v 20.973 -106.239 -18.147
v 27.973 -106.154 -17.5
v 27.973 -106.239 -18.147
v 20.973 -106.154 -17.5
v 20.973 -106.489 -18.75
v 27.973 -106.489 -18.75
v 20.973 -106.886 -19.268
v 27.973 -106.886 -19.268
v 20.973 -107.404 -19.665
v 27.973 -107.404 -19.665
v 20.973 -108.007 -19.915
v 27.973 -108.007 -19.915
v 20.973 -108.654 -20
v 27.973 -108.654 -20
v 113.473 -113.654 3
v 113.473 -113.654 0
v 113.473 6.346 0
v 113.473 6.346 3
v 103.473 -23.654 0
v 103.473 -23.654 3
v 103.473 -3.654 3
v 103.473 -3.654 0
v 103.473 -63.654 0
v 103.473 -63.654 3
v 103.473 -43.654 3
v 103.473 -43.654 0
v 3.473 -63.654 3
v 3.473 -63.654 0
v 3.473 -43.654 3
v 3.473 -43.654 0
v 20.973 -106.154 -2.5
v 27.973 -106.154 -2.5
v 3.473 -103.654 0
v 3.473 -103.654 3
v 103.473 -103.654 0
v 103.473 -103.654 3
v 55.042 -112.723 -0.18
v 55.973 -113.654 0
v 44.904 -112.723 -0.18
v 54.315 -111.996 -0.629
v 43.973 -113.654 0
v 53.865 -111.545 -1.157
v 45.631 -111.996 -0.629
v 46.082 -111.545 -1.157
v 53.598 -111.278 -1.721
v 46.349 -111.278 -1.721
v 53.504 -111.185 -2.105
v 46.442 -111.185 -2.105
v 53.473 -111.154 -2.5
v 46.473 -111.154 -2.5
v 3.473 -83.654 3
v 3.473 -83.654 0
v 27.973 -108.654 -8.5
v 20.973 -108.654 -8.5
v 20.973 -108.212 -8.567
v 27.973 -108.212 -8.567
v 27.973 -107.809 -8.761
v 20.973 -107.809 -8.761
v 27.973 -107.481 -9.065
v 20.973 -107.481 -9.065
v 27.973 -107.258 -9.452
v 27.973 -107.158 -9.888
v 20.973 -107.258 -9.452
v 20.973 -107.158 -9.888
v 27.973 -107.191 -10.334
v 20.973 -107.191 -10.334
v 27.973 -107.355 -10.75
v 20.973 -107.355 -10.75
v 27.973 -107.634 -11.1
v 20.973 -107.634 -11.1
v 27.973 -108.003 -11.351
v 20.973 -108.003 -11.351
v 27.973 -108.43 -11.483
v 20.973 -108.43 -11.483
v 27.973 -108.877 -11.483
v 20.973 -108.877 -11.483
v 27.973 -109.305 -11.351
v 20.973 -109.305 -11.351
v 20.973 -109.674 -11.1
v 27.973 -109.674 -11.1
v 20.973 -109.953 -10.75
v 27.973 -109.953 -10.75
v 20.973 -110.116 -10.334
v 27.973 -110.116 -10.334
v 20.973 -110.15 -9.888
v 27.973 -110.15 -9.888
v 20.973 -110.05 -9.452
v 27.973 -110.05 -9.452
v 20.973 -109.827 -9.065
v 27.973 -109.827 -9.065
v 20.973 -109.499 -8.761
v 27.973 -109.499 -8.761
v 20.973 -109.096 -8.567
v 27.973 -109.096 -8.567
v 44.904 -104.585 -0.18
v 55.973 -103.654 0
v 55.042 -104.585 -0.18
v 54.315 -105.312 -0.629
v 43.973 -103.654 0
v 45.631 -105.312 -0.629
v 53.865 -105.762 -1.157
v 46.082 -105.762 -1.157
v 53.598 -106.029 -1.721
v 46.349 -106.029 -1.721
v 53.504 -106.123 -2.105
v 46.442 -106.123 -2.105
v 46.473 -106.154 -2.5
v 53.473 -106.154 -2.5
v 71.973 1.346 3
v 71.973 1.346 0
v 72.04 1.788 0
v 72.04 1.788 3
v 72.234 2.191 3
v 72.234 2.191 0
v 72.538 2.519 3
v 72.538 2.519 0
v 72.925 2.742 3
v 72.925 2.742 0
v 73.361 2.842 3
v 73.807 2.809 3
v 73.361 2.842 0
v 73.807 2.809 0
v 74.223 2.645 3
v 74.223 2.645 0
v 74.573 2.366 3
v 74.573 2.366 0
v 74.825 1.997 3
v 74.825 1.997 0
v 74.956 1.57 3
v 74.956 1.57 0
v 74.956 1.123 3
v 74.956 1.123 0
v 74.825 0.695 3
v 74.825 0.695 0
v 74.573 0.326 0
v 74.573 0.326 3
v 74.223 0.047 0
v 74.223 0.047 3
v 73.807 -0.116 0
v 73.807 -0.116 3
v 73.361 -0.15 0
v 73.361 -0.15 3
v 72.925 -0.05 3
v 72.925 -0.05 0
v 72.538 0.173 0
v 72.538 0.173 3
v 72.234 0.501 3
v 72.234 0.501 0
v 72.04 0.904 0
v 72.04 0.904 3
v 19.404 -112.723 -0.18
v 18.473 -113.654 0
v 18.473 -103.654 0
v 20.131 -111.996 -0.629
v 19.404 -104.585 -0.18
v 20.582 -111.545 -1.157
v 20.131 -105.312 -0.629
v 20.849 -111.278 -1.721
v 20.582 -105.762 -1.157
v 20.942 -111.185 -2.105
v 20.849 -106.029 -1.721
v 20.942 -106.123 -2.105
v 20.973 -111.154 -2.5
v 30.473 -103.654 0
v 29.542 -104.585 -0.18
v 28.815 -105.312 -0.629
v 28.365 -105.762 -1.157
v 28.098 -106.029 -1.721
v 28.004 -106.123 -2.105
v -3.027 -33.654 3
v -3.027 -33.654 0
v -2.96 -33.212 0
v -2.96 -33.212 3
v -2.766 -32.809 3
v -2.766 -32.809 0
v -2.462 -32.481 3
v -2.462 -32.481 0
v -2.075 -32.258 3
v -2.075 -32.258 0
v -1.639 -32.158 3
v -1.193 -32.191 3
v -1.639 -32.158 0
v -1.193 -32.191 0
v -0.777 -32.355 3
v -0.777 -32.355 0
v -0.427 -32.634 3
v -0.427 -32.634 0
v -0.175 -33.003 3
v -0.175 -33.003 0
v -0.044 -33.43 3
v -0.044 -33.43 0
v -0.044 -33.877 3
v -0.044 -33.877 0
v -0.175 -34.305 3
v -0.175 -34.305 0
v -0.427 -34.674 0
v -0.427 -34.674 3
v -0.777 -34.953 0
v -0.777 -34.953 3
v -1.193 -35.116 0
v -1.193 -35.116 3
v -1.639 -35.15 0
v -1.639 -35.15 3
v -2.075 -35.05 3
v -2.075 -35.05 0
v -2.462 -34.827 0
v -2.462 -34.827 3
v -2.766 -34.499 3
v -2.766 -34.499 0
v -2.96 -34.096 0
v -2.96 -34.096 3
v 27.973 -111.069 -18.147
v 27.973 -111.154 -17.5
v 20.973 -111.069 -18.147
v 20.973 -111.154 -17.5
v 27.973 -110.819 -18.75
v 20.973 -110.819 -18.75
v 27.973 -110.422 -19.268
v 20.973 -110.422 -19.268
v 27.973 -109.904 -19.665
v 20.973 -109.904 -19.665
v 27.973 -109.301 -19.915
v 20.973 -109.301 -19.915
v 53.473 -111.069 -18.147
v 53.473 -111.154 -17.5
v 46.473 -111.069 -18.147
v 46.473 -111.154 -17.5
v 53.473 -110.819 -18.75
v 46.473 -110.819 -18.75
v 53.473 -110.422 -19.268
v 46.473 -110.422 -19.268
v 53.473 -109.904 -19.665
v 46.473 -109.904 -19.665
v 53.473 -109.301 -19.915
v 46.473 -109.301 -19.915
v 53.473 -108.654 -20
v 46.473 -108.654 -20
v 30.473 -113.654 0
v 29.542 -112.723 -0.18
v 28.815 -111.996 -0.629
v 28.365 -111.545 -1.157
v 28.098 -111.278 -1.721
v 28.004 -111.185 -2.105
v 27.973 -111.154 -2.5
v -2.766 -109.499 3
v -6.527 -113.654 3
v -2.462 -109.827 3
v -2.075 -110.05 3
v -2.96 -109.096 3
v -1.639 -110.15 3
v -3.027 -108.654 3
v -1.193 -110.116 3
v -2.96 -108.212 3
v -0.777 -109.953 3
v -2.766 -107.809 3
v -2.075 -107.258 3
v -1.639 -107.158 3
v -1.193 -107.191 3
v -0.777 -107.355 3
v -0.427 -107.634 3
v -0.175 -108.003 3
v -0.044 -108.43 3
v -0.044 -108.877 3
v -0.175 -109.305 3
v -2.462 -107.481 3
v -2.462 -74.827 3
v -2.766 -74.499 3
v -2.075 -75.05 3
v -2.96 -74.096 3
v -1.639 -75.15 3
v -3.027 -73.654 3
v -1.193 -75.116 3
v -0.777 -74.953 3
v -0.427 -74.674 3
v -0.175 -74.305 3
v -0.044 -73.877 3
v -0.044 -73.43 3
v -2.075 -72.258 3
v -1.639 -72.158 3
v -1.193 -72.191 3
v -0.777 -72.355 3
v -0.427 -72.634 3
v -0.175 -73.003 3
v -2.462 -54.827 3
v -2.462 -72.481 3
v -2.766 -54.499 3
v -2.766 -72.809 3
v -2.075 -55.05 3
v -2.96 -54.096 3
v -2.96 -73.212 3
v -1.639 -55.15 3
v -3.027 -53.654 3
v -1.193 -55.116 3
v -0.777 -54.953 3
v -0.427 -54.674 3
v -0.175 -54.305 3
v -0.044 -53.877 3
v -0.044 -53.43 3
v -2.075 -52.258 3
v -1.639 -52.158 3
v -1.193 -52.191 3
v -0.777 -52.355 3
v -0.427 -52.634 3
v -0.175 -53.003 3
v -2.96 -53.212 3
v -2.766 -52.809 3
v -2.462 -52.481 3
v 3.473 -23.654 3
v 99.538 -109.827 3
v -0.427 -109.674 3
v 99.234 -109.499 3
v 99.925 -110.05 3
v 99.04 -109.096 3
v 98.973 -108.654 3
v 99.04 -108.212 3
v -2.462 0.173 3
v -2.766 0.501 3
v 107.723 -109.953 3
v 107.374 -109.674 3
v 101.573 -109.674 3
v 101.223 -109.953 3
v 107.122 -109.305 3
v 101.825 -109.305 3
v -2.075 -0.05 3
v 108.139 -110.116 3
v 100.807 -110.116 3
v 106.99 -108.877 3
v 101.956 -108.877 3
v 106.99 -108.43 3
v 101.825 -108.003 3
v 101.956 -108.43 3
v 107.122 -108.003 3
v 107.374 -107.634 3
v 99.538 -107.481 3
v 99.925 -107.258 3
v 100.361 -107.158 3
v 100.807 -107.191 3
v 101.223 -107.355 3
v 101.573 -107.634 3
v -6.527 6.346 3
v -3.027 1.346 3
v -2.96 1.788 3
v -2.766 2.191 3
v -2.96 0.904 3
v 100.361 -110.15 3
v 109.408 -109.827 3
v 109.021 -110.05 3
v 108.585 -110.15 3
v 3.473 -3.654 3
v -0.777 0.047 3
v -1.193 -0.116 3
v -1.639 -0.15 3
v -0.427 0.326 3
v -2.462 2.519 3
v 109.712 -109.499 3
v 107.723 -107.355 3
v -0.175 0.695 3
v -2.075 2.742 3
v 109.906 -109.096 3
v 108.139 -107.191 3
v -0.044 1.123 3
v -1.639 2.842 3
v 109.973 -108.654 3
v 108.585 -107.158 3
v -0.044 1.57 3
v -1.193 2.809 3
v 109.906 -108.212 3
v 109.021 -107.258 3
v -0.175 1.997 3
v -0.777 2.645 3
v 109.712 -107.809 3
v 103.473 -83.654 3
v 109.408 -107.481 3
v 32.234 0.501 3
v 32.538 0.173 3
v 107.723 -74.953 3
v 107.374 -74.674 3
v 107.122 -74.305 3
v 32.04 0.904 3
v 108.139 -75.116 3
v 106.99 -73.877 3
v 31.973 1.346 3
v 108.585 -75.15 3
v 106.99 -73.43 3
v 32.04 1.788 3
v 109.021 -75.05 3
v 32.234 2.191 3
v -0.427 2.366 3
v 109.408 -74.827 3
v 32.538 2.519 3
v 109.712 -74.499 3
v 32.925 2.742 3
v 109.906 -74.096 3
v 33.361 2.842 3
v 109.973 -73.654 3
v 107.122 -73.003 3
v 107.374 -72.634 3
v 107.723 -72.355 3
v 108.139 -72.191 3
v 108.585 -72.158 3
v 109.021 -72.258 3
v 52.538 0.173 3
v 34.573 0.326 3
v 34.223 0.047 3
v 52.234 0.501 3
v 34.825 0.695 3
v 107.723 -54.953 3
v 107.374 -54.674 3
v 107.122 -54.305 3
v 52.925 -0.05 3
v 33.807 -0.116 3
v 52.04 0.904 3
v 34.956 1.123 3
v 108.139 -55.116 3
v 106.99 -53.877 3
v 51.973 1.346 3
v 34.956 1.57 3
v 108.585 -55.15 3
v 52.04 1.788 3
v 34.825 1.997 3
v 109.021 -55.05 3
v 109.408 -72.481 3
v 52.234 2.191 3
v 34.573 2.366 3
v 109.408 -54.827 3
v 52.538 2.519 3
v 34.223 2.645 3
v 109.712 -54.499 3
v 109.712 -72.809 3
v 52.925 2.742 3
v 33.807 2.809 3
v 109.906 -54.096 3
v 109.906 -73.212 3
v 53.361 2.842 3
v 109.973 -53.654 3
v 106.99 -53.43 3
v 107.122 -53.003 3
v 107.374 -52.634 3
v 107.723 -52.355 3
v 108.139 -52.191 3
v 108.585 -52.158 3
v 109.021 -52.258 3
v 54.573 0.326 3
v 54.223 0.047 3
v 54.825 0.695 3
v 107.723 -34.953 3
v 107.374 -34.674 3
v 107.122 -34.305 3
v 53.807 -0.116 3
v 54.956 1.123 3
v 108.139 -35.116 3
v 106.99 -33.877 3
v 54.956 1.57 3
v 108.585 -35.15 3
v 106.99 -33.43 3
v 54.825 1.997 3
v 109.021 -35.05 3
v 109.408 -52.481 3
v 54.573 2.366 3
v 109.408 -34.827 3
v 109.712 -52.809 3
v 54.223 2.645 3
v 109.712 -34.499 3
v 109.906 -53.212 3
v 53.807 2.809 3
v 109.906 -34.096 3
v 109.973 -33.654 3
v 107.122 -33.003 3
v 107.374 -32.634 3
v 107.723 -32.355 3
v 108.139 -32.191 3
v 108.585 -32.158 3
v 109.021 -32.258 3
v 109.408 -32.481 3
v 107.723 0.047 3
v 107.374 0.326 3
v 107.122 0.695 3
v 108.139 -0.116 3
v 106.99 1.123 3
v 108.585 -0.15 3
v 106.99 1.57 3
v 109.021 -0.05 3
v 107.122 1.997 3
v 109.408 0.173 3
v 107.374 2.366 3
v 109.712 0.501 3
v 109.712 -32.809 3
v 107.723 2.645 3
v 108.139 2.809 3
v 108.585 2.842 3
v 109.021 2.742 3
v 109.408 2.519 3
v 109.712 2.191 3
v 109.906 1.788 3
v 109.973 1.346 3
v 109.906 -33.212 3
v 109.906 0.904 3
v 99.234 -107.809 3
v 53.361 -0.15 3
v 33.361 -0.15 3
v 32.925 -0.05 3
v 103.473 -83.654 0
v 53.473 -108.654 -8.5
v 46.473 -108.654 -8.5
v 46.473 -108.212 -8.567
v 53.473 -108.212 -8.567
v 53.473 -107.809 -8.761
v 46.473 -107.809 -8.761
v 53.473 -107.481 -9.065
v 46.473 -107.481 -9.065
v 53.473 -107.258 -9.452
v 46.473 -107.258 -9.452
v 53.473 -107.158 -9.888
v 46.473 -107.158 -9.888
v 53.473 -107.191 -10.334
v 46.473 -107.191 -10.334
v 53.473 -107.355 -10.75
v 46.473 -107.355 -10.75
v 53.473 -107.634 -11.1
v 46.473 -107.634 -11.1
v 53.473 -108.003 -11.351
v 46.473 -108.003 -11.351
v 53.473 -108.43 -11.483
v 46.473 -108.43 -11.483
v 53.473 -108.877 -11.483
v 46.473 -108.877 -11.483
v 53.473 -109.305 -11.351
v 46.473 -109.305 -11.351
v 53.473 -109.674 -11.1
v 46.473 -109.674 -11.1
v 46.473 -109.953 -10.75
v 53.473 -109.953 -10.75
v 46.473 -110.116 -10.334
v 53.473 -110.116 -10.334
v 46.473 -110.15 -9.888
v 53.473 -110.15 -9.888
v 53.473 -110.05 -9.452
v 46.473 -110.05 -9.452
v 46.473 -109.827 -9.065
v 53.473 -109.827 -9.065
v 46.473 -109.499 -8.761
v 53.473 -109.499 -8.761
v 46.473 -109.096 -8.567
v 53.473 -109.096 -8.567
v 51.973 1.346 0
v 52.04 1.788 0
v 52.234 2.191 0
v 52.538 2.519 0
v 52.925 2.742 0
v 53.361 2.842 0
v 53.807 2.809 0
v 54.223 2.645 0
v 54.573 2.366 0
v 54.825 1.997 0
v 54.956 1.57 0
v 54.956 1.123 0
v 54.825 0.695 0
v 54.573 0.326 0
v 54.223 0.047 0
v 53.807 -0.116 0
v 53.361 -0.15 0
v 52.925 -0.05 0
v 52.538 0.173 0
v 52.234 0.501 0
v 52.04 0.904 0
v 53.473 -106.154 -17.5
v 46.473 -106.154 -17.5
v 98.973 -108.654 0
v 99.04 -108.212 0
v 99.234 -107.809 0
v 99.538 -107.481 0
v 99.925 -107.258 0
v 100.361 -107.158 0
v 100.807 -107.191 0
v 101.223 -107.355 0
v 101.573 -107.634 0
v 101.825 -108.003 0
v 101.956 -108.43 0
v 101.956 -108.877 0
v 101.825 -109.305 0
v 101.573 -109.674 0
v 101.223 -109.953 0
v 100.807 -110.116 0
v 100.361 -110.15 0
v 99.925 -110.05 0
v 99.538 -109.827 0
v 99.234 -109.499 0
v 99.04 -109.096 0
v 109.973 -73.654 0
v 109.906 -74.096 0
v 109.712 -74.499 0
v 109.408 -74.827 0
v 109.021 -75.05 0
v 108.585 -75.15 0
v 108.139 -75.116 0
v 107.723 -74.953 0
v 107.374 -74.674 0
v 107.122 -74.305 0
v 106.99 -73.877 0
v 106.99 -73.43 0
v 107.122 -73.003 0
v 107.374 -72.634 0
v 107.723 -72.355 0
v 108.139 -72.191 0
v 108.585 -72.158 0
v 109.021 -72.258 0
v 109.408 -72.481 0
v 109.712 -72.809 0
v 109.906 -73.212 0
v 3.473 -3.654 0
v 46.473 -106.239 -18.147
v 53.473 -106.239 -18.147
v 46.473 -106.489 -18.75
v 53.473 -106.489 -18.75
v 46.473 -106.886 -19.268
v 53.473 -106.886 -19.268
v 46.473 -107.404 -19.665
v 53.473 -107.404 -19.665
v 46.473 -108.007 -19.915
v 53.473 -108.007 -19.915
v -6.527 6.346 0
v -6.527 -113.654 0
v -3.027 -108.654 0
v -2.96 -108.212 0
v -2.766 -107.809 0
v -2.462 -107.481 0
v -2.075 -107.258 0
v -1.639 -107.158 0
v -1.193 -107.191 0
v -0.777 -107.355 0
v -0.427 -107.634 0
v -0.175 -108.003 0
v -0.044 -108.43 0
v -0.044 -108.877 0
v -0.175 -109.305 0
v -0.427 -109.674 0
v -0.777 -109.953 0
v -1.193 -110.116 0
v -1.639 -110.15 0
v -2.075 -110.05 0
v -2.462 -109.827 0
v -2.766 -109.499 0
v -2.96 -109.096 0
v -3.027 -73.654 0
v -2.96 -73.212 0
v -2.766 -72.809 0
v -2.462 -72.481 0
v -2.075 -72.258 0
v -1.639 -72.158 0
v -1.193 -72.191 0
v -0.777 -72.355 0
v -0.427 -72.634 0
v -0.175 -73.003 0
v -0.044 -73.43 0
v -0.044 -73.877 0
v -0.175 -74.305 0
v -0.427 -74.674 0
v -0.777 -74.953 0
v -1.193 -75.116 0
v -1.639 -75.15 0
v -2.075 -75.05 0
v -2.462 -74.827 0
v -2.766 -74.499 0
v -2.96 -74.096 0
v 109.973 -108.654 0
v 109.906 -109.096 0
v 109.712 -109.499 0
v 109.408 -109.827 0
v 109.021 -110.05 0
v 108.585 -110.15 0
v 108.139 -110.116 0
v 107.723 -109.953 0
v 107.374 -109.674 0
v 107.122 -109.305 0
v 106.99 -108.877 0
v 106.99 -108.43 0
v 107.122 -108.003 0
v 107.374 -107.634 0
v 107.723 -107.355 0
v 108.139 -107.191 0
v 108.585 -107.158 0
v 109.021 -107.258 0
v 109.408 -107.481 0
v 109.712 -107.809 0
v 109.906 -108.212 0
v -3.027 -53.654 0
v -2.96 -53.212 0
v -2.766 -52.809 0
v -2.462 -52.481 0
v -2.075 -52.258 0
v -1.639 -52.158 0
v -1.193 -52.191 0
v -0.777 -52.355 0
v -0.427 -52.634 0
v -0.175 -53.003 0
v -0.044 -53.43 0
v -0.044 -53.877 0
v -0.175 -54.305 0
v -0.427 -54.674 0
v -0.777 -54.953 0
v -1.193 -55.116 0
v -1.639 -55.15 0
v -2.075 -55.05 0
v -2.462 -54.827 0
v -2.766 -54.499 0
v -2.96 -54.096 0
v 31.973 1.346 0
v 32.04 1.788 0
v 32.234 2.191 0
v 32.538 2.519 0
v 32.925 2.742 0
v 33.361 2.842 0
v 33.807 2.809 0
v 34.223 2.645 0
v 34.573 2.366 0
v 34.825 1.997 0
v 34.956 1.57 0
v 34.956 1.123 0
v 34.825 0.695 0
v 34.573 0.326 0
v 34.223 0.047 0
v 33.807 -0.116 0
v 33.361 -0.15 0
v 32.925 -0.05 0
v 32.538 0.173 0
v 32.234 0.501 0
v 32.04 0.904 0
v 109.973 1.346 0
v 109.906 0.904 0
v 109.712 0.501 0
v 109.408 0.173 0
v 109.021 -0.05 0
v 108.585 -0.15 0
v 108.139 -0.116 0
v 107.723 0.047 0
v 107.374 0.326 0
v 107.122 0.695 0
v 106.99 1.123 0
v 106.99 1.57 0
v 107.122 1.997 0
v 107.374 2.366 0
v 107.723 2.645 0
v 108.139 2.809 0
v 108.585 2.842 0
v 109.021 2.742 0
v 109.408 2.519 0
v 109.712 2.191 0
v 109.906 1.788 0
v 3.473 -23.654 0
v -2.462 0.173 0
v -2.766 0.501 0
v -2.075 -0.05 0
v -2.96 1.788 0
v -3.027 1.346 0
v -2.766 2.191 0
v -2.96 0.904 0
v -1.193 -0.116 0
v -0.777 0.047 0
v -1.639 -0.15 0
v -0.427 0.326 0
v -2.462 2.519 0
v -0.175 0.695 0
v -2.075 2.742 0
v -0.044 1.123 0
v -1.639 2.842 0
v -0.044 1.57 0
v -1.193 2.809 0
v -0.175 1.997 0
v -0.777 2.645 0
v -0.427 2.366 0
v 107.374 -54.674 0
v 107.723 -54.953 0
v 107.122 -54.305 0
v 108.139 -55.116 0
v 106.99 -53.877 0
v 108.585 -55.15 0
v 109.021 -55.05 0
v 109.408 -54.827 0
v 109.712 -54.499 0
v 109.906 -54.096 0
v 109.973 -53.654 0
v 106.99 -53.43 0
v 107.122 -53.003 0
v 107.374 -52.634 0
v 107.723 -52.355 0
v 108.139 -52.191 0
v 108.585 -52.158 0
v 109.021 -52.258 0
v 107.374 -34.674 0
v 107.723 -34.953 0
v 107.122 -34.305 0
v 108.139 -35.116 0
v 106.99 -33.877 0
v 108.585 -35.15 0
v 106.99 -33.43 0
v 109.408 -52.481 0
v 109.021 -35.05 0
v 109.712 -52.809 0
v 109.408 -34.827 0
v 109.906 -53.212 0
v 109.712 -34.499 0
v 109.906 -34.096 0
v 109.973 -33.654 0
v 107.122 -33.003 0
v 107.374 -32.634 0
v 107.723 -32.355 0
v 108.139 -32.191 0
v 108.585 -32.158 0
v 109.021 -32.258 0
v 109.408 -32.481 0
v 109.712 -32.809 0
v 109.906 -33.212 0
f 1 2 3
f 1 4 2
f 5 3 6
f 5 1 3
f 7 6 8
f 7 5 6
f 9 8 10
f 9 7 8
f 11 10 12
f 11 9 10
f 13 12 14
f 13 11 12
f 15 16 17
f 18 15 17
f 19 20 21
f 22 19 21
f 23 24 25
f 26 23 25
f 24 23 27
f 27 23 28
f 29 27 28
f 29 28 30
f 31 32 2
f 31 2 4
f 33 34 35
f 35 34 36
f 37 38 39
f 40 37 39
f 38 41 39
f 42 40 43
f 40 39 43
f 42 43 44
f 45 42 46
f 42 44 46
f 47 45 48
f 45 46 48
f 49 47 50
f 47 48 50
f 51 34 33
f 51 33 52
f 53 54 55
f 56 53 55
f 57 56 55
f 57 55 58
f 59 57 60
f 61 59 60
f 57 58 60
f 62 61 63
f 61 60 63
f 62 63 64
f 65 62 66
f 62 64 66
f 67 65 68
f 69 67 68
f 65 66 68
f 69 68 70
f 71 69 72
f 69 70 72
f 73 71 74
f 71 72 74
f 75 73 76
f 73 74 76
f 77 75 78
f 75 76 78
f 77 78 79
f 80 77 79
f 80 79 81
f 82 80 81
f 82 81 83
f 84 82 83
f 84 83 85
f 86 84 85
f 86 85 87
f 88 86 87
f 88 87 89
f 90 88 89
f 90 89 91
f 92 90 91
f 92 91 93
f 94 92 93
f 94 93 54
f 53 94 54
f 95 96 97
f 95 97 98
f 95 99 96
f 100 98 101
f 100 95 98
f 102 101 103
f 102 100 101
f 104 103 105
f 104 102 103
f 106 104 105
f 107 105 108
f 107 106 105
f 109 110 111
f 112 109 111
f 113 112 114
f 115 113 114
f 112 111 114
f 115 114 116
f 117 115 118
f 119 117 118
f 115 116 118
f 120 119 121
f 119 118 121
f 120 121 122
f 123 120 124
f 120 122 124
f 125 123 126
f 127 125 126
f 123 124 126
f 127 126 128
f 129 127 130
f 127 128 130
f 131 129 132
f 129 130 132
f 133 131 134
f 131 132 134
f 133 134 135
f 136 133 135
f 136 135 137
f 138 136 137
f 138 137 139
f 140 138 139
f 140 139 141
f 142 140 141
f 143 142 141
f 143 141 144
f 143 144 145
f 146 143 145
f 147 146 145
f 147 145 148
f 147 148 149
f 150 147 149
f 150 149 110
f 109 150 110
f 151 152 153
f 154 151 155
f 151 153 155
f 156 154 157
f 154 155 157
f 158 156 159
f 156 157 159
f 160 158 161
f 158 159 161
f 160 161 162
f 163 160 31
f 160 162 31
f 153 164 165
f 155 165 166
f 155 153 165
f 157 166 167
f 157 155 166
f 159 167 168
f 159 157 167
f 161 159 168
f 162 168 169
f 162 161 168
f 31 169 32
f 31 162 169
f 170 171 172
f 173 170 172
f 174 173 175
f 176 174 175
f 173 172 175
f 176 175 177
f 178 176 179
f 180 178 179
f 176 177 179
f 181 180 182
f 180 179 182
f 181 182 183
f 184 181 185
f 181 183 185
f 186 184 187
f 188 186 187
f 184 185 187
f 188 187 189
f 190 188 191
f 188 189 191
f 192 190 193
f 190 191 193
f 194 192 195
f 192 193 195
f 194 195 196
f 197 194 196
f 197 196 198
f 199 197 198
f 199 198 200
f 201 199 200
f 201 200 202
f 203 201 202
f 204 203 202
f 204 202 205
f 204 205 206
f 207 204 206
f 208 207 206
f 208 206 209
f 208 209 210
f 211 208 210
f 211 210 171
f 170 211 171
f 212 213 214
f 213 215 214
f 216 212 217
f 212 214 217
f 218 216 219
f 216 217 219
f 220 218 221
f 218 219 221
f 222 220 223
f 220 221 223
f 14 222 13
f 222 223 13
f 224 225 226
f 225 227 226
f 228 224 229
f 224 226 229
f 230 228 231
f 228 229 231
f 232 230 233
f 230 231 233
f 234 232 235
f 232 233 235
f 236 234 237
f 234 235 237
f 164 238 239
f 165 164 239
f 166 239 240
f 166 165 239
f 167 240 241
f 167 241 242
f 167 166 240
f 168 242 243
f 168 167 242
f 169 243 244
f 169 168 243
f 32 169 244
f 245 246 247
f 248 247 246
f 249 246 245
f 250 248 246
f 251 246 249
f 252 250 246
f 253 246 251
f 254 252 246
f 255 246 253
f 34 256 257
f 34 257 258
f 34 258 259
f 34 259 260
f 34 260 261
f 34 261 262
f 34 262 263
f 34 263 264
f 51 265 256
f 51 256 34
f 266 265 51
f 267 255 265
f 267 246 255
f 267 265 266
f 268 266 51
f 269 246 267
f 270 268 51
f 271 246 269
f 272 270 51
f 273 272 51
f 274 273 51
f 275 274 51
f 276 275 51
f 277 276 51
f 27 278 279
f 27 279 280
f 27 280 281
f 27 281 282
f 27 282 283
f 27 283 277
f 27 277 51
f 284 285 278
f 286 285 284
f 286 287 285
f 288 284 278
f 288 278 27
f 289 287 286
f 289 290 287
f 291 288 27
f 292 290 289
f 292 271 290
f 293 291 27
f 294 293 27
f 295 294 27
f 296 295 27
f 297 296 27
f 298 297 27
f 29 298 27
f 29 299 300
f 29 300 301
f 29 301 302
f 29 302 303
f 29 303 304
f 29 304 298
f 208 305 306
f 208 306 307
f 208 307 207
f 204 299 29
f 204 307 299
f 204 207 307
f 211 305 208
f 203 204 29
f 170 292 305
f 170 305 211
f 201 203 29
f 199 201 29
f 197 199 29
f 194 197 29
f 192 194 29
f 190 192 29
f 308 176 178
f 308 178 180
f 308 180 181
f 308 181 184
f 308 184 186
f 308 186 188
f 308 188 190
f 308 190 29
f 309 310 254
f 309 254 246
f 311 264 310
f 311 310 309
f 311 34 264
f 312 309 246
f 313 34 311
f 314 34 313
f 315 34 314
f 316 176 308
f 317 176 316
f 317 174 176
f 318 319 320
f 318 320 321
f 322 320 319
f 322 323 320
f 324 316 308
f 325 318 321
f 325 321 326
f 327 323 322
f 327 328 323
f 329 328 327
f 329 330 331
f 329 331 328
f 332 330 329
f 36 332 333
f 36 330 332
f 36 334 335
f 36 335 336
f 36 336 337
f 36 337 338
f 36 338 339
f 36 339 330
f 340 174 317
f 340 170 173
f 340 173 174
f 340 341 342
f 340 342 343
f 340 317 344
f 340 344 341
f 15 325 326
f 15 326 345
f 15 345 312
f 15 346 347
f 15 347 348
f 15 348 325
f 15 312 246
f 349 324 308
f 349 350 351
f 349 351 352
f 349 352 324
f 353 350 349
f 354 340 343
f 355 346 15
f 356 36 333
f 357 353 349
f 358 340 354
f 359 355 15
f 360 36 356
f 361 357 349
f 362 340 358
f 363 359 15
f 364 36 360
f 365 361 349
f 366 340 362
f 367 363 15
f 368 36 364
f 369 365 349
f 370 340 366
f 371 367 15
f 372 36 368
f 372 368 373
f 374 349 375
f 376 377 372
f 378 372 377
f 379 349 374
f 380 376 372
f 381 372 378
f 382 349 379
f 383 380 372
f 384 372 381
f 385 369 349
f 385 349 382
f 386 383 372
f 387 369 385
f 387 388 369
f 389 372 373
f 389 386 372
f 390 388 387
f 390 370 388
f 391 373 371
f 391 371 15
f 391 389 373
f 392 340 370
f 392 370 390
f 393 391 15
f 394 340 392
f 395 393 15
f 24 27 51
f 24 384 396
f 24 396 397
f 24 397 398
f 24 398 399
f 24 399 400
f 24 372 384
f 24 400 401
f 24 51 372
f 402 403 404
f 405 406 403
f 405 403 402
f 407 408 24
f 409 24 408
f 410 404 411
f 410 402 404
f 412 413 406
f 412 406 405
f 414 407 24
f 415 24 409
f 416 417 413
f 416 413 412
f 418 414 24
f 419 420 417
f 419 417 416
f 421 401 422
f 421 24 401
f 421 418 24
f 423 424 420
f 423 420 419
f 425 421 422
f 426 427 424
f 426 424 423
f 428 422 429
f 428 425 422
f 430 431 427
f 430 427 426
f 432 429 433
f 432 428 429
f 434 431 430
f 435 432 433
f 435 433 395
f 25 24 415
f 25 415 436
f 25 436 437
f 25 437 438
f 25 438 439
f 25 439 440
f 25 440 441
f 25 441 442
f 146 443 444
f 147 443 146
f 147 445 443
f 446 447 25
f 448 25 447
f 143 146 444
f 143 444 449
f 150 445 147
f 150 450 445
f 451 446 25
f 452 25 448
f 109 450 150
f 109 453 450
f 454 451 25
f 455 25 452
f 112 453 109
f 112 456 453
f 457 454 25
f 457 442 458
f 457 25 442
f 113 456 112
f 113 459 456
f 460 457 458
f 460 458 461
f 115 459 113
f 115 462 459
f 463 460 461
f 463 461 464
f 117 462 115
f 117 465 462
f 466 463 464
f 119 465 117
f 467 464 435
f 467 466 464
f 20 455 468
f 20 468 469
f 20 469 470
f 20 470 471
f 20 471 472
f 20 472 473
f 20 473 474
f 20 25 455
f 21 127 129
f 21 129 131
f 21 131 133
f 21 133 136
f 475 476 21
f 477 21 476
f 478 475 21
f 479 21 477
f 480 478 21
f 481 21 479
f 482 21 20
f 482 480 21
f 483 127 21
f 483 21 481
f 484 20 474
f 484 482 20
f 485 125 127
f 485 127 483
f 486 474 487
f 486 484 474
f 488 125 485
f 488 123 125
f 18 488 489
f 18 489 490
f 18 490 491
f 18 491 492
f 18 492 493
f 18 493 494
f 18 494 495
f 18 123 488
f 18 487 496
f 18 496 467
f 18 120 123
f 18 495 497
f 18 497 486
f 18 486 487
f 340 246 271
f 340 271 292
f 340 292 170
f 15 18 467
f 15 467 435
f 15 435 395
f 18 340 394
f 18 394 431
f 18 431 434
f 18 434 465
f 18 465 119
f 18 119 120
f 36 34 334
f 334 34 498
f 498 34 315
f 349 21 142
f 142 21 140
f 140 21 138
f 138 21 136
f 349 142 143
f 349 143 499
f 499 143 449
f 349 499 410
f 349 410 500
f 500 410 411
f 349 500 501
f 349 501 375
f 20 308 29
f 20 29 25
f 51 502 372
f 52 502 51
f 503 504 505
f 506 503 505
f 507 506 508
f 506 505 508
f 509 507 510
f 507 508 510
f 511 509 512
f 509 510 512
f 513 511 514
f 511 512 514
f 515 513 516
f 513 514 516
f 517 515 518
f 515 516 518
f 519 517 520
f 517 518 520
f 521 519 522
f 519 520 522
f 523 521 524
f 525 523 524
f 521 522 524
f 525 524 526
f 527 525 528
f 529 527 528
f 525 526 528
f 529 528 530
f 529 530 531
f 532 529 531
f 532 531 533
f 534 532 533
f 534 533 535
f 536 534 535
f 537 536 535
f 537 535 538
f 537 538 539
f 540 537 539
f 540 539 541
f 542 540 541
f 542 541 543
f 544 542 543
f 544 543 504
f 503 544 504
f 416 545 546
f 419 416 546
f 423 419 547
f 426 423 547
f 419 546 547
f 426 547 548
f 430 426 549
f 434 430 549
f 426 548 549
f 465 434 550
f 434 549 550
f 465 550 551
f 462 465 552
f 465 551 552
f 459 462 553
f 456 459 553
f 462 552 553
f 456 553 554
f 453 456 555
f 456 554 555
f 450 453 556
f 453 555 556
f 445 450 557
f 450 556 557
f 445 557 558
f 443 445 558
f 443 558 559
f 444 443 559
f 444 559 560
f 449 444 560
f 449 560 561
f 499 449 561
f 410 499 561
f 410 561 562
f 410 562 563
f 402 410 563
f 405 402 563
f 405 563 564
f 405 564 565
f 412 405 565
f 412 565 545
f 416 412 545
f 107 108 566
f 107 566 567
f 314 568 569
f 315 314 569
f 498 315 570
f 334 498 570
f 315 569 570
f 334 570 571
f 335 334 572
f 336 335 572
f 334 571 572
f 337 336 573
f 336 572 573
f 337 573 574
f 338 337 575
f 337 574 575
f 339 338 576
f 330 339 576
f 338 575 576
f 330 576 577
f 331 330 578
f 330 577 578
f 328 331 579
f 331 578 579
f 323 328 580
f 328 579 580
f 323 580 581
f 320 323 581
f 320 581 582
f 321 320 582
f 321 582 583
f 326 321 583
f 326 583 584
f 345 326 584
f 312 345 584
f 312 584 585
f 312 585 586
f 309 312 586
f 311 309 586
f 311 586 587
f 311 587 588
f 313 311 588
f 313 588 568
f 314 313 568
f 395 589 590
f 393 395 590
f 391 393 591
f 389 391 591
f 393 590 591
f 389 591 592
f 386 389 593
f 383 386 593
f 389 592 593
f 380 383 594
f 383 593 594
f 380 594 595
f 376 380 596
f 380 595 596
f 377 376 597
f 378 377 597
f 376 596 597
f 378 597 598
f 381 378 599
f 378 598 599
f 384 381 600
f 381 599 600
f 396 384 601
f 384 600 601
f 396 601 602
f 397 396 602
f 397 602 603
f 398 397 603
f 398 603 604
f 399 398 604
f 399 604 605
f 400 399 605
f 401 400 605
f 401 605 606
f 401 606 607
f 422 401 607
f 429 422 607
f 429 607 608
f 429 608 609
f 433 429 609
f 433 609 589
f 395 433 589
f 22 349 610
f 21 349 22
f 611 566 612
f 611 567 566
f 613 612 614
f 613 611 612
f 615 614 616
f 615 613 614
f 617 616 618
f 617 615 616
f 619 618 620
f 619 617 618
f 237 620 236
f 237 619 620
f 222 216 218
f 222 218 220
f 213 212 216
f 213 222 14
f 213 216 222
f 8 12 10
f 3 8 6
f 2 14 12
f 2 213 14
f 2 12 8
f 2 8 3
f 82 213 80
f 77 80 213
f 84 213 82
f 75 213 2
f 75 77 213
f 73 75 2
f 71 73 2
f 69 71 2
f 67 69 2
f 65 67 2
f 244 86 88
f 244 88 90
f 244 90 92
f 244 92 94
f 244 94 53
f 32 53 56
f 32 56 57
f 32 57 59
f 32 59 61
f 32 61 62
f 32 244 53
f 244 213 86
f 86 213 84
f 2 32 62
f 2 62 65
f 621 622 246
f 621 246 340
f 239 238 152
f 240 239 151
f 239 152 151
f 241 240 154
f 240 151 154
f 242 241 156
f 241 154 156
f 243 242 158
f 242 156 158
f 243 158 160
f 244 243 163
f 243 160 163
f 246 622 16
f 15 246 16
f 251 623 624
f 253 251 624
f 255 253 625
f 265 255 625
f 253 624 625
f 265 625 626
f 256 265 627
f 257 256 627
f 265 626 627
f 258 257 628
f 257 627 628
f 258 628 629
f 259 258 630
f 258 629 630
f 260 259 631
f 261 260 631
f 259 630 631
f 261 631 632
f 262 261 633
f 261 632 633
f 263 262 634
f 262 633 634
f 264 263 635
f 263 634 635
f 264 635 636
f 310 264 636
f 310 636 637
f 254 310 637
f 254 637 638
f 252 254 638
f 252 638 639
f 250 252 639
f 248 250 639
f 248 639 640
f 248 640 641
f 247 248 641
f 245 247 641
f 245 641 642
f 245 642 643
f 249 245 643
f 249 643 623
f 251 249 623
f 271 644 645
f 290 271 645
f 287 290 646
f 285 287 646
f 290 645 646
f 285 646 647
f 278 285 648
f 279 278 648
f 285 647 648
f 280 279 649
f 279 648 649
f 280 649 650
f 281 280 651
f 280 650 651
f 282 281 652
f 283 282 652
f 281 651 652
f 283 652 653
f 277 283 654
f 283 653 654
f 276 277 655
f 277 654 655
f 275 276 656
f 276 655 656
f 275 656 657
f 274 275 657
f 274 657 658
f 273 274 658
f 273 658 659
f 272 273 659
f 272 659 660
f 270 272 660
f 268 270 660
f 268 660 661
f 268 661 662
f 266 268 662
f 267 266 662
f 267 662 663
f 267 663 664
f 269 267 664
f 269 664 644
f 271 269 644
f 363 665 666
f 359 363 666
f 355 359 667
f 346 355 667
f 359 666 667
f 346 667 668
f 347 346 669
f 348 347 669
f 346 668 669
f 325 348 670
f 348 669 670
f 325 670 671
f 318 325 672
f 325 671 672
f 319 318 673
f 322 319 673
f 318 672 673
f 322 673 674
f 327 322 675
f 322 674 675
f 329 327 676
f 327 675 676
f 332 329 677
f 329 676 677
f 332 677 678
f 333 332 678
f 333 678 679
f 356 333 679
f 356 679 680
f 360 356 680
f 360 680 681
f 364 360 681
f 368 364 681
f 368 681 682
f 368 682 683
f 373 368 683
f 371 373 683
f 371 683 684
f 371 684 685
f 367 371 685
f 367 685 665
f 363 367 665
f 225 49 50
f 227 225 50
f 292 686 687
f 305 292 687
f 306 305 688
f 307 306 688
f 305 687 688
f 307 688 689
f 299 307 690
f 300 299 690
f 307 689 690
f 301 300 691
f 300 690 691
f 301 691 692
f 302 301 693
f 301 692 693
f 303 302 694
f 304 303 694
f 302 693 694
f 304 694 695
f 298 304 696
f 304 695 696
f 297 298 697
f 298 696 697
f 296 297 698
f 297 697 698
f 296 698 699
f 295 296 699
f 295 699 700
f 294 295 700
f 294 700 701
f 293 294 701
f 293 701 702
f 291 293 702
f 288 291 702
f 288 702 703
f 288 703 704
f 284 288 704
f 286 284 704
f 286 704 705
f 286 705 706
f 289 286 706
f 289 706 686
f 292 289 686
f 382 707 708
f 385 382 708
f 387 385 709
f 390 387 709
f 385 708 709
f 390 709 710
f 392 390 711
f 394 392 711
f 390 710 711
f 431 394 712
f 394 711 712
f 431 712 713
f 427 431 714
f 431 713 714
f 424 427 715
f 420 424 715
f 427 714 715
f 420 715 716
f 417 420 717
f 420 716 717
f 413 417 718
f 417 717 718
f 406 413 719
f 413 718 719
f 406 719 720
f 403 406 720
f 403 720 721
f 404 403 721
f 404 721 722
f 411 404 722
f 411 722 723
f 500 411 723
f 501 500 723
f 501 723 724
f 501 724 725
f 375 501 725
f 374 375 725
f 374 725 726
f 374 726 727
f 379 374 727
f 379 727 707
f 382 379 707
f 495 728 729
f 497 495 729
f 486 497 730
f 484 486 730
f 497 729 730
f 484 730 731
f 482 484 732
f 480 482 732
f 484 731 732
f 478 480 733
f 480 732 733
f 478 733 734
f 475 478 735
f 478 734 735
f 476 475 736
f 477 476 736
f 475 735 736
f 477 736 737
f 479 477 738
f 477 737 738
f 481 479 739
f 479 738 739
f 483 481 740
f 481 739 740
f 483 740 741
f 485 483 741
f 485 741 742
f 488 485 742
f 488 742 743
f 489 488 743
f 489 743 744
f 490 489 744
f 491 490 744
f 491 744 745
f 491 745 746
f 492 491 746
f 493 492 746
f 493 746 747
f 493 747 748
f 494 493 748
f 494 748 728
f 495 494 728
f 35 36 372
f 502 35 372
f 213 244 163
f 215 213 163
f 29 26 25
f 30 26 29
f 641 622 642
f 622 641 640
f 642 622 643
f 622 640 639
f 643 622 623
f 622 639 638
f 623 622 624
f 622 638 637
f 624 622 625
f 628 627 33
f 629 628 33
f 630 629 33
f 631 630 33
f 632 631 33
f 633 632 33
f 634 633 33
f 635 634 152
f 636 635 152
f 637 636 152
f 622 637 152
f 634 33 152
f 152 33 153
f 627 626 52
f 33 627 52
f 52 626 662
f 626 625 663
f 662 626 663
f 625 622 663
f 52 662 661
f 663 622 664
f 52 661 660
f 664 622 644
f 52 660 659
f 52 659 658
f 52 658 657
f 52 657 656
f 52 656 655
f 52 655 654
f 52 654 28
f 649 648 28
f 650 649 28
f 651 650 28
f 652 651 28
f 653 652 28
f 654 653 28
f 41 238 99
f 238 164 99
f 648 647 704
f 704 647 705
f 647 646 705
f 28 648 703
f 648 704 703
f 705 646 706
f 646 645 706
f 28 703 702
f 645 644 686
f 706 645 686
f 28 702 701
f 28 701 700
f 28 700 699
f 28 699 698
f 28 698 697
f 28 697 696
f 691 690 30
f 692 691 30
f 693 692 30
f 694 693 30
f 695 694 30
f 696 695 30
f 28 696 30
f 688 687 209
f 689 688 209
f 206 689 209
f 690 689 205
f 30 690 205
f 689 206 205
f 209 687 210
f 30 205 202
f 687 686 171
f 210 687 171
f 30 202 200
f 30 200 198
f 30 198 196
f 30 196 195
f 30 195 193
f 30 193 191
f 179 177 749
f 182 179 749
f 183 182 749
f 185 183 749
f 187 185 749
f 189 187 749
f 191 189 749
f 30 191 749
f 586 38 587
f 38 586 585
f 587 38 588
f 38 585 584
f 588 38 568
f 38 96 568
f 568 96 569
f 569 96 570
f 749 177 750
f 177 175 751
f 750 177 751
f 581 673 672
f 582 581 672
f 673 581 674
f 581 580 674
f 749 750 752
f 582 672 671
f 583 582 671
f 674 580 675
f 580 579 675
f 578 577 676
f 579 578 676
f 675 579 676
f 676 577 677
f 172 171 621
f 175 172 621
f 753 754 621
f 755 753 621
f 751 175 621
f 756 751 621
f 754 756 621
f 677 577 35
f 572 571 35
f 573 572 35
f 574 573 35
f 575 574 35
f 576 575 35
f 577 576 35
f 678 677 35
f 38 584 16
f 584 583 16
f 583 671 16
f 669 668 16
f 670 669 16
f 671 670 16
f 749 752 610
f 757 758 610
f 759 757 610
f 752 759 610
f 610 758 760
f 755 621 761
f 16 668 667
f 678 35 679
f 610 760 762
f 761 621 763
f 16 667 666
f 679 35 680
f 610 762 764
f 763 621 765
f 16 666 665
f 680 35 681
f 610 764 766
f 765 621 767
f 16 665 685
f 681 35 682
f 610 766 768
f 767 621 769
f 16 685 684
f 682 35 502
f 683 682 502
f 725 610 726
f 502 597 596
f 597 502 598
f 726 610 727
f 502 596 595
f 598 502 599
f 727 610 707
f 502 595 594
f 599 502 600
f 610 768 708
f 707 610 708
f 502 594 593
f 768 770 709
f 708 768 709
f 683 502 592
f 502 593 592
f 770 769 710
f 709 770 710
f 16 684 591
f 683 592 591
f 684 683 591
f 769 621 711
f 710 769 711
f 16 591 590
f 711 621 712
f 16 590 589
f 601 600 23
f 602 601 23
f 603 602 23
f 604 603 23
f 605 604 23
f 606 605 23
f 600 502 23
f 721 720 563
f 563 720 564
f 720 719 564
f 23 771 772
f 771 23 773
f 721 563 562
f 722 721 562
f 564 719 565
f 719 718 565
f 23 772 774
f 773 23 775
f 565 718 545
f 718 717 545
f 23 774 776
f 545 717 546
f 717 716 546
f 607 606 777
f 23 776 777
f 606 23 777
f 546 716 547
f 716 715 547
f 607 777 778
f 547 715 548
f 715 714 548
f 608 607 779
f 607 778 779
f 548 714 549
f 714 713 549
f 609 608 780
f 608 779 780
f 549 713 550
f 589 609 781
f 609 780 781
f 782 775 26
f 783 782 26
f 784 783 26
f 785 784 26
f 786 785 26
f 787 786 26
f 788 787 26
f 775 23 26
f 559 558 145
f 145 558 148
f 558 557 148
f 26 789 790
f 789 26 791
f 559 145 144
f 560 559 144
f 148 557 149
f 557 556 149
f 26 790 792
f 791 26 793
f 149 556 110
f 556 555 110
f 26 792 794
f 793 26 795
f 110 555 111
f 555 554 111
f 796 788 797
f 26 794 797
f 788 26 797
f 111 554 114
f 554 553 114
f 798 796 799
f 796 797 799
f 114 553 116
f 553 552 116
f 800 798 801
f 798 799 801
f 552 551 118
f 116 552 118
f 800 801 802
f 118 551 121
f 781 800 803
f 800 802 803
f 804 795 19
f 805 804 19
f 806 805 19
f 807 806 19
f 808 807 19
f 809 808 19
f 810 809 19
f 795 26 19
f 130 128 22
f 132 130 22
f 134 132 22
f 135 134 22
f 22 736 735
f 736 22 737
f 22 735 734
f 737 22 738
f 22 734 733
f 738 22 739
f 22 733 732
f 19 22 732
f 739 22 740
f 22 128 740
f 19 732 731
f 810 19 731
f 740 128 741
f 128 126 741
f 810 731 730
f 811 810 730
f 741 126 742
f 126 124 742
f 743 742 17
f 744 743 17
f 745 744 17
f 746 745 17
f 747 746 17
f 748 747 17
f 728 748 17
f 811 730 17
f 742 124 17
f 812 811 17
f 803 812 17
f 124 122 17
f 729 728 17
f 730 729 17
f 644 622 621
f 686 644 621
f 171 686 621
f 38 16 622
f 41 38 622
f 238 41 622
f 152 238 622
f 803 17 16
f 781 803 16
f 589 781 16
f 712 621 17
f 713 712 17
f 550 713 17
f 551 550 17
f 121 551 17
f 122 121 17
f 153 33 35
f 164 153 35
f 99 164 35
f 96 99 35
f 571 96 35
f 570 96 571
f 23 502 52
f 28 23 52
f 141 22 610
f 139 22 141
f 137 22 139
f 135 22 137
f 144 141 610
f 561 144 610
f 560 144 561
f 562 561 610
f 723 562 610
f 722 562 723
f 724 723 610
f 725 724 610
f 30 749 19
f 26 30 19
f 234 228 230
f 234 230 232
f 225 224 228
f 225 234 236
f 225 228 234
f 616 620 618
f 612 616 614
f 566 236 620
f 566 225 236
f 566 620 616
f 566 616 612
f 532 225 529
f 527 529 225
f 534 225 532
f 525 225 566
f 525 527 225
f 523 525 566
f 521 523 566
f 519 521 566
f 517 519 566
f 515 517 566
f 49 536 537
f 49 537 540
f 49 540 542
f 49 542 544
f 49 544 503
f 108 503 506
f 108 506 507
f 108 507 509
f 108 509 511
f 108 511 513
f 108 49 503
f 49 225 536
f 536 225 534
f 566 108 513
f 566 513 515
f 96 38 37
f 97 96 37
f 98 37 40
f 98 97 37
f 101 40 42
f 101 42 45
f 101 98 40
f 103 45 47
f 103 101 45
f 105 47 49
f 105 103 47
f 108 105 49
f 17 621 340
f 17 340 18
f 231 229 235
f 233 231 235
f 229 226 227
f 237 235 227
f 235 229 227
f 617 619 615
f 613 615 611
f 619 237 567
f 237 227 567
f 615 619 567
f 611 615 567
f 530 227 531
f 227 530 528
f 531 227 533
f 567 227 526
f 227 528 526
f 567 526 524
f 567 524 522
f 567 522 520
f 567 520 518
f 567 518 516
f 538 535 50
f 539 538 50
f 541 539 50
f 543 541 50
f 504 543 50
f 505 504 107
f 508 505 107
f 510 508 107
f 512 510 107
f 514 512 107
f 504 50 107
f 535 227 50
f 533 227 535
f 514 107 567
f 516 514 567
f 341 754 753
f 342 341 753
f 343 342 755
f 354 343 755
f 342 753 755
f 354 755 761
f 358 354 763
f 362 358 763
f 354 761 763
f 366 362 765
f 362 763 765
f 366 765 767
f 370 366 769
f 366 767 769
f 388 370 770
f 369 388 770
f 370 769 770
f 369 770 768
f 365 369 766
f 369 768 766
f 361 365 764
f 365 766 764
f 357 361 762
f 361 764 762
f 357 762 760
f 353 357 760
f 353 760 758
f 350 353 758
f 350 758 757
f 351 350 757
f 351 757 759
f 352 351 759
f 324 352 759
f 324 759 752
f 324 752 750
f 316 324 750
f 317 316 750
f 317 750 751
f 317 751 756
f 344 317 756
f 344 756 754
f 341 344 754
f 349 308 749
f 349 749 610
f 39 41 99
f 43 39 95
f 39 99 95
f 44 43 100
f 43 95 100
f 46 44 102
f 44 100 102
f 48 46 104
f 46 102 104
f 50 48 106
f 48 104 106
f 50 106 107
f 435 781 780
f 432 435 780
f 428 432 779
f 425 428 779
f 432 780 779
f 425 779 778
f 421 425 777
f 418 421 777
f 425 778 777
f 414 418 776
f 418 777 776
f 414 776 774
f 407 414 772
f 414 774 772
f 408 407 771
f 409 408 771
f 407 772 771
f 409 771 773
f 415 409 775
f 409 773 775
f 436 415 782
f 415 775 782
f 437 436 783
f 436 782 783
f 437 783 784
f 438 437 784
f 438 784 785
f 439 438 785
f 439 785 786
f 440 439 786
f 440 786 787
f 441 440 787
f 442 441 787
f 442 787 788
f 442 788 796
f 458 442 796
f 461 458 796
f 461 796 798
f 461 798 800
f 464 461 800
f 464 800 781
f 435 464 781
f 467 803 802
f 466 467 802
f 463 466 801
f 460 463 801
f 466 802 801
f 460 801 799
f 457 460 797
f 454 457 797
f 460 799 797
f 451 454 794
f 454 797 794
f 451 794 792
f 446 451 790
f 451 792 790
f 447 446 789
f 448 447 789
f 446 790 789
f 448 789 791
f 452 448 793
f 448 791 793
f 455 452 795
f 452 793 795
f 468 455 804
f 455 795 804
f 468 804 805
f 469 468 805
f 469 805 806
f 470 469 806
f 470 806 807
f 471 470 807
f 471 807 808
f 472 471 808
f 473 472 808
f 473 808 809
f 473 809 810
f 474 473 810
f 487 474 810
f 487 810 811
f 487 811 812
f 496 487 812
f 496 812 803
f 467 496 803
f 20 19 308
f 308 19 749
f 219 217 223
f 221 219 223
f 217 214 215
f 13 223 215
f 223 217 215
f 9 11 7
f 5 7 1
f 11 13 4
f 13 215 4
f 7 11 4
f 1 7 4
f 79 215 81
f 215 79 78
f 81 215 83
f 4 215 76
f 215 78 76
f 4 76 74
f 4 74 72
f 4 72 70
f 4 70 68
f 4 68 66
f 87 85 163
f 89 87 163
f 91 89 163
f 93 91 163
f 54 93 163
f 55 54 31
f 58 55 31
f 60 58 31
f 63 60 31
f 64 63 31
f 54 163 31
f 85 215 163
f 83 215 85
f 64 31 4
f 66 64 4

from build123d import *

# Parameters (mm, degrees)
ESBO_O1_W                = 120
ESBO_O1_H                = 120
RESSALTO_EXTRUS_O1_DEPTH = 3
ESBO_O2_W                = 100
ESBO_O2_H                = 100
CORTE_EXTRUS_O1_DEPTH    = 161.631068924
ESBO_O5_W                = 7
ESBO_O5_H                = 5
RESSALTO_EXTRUS_O2_DEPTH = 20
ESBO_O6_R                = 1.5
CORTE_EXTRUS_O2_DEPTH    = 10
ESBO_O7_R                = 1.5
CORTE_EXTRUS_O3_DEPTH    = 162.843567384
ESBO_O8_R                = 1.5
CORTE_EXTRUS_O4_DEPTH    = 148.896743526
FILETE2_R                = 2.5
ESBO_O9_W                = 100
ESBO_O9_H                = 20
RESSALTO_EXTRUS_O3_DEPTH = 3
ESBO_O10_R               = 1.5
CORTE_EXTRUS_O5_DEPTH    = 10


with BuildPart() as part:
    # Esboço1 → Ressalto-extrusão1 (new body)
    with BuildSketch(Plane.XY):
        with Locations((53.473096186, -53.653846154)):
            Rectangle(ESBO_O1_W, ESBO_O1_H)
    extrude(amount=RESSALTO_EXTRUS_O1_DEPTH)

    # Esboço2 → Corte-extrusão1 (cut, through all)
    with BuildSketch(Plane.XY.offset(3)):
        with Locations((53.473096186, -53.653846154)):
            Rectangle(ESBO_O2_W, ESBO_O2_H)
    extrude(amount=-CORTE_EXTRUS_O1_DEPTH, mode=Mode.SUBTRACT)

    # Esboço5 → Ressalto-extrusão2 (add)
    with BuildSketch(Plane(origin=(0, 0, 0), x_dir=(-1, 0, 0), z_dir=(0, 0, -1))):
        with Locations((-49.973096186, -108.653846154)):
            Rectangle(ESBO_O5_W, ESBO_O5_H)
        with Locations((-24.473096186, -108.653846154)):
            Rectangle(ESBO_O5_W, ESBO_O5_H)
    extrude(amount=RESSALTO_EXTRUS_O2_DEPTH)

    # Esboço6 → Corte-extrusão2 (cut)
    with BuildSketch(Plane(origin=(0, 0, 0), x_dir=(-1, 0, 0), z_dir=(0, 0, -1))):
        with Locations((1.526903814, -108.653846154)):
            Circle(ESBO_O6_R)
        with Locations((1.526903814, -73.653846154)):
            Circle(ESBO_O6_R)
        with Locations((1.526903814, -53.653846154)):
            Circle(ESBO_O6_R)
        with Locations((1.526903814, -33.653846154)):
            Circle(ESBO_O6_R)
        with Locations((1.526903814, 1.346153846)):
            Circle(ESBO_O6_R)
        with Locations(Location((-108.473096186, 1.346153846, 0), (0, 0, 180))):
            Circle(ESBO_O6_R)
        with Locations(Location((-108.473096186, -33.653846154, 0), (0, 0, 180))):
            Circle(ESBO_O6_R)
        with Locations(Location((-108.473096186, -53.653846154, 0), (0, 0, 180))):
            Circle(ESBO_O6_R)
        with Locations(Location((-108.473096186, -73.653846154, 0), (0, 0, 180))):
            Circle(ESBO_O6_R)
        with Locations(Location((-108.473096186, -108.653846154, 0), (0, 0, 180))):
            Circle(ESBO_O6_R)
    extrude(amount=-CORTE_EXTRUS_O2_DEPTH, mode=Mode.SUBTRACT)

    # Esboço7 → Corte-extrusão3 (cut, through all)
    with BuildSketch(Plane(origin=(0, 0, 0), x_dir=(-1, 0, 0), z_dir=(0, 0, -1))):
        with Locations((-100.473096186, -108.653846154)):
            Circle(ESBO_O7_R)
    extrude(amount=-CORTE_EXTRUS_O3_DEPTH, mode=Mode.SUBTRACT)

    # Esboço8 → Corte-extrusão4 (cut, through all)
    with BuildSketch(Plane.ZY.offset(-20.973096186)):
        with Locations((-10, -108.653846154)):
            Circle(ESBO_O8_R)
    extrude(amount=-CORTE_EXTRUS_O4_DEPTH, mode=Mode.SUBTRACT)

    # Filete2
    filete2_edges = [part.edges().sort_by_distance(p)[0] for p in [
        (49.973096186, -106.153846154, 0),
        (49.973096186, -106.153846154, -20),
        (49.973096186, -111.153846154, -20),
        (46.473096186, -108.653846154, 0),
        (53.473096186, -108.653846154, 0),
        (49.973096186, -111.153846154, 0),
        (24.473096186, -106.153846154, -20),
        (24.473096186, -111.153846154, -20),
        (24.473096186, -106.153846154, 0),
        (27.973096186, -108.653846154, 0),
        (24.473096186, -111.153846154, 0),
        (20.973096186, -108.653846154, 0),
    ]]
    fillet(filete2_edges, radius=FILETE2_R - 0.0001)  # a hair under: the kernel refuses the full size

    # Esboço9 → Ressalto-extrusão3 (add)
    with BuildSketch(Plane(origin=(0, 0, 0), x_dir=(-1, 0, 0), z_dir=(0, 0, -1))):
        with Locations((-53.473096186, -73.653846154)):
            Rectangle(ESBO_O9_W, ESBO_O9_H)
        with Locations((-53.473096186, -33.653846154)):
            Rectangle(ESBO_O9_W, ESBO_O9_H)
    extrude(amount=-RESSALTO_EXTRUS_O3_DEPTH)

    # Esboço10 → Corte-extrusão5 (cut)
    with BuildSketch(Plane(origin=(0, 0, 0), x_dir=(-1, 0, 0), z_dir=(0, 0, -1))):
        with Locations((-33.473096186, 1.346153846)):
            Circle(ESBO_O10_R)
        with Locations((-53.473096186, 1.346153846)):
            Circle(ESBO_O10_R)
        with Locations((-73.473096186, 1.346153846)):
            Circle(ESBO_O10_R)
    extrude(amount=-CORTE_EXTRUS_O5_DEPTH, mode=Mode.SUBTRACT)


solid = part.part
